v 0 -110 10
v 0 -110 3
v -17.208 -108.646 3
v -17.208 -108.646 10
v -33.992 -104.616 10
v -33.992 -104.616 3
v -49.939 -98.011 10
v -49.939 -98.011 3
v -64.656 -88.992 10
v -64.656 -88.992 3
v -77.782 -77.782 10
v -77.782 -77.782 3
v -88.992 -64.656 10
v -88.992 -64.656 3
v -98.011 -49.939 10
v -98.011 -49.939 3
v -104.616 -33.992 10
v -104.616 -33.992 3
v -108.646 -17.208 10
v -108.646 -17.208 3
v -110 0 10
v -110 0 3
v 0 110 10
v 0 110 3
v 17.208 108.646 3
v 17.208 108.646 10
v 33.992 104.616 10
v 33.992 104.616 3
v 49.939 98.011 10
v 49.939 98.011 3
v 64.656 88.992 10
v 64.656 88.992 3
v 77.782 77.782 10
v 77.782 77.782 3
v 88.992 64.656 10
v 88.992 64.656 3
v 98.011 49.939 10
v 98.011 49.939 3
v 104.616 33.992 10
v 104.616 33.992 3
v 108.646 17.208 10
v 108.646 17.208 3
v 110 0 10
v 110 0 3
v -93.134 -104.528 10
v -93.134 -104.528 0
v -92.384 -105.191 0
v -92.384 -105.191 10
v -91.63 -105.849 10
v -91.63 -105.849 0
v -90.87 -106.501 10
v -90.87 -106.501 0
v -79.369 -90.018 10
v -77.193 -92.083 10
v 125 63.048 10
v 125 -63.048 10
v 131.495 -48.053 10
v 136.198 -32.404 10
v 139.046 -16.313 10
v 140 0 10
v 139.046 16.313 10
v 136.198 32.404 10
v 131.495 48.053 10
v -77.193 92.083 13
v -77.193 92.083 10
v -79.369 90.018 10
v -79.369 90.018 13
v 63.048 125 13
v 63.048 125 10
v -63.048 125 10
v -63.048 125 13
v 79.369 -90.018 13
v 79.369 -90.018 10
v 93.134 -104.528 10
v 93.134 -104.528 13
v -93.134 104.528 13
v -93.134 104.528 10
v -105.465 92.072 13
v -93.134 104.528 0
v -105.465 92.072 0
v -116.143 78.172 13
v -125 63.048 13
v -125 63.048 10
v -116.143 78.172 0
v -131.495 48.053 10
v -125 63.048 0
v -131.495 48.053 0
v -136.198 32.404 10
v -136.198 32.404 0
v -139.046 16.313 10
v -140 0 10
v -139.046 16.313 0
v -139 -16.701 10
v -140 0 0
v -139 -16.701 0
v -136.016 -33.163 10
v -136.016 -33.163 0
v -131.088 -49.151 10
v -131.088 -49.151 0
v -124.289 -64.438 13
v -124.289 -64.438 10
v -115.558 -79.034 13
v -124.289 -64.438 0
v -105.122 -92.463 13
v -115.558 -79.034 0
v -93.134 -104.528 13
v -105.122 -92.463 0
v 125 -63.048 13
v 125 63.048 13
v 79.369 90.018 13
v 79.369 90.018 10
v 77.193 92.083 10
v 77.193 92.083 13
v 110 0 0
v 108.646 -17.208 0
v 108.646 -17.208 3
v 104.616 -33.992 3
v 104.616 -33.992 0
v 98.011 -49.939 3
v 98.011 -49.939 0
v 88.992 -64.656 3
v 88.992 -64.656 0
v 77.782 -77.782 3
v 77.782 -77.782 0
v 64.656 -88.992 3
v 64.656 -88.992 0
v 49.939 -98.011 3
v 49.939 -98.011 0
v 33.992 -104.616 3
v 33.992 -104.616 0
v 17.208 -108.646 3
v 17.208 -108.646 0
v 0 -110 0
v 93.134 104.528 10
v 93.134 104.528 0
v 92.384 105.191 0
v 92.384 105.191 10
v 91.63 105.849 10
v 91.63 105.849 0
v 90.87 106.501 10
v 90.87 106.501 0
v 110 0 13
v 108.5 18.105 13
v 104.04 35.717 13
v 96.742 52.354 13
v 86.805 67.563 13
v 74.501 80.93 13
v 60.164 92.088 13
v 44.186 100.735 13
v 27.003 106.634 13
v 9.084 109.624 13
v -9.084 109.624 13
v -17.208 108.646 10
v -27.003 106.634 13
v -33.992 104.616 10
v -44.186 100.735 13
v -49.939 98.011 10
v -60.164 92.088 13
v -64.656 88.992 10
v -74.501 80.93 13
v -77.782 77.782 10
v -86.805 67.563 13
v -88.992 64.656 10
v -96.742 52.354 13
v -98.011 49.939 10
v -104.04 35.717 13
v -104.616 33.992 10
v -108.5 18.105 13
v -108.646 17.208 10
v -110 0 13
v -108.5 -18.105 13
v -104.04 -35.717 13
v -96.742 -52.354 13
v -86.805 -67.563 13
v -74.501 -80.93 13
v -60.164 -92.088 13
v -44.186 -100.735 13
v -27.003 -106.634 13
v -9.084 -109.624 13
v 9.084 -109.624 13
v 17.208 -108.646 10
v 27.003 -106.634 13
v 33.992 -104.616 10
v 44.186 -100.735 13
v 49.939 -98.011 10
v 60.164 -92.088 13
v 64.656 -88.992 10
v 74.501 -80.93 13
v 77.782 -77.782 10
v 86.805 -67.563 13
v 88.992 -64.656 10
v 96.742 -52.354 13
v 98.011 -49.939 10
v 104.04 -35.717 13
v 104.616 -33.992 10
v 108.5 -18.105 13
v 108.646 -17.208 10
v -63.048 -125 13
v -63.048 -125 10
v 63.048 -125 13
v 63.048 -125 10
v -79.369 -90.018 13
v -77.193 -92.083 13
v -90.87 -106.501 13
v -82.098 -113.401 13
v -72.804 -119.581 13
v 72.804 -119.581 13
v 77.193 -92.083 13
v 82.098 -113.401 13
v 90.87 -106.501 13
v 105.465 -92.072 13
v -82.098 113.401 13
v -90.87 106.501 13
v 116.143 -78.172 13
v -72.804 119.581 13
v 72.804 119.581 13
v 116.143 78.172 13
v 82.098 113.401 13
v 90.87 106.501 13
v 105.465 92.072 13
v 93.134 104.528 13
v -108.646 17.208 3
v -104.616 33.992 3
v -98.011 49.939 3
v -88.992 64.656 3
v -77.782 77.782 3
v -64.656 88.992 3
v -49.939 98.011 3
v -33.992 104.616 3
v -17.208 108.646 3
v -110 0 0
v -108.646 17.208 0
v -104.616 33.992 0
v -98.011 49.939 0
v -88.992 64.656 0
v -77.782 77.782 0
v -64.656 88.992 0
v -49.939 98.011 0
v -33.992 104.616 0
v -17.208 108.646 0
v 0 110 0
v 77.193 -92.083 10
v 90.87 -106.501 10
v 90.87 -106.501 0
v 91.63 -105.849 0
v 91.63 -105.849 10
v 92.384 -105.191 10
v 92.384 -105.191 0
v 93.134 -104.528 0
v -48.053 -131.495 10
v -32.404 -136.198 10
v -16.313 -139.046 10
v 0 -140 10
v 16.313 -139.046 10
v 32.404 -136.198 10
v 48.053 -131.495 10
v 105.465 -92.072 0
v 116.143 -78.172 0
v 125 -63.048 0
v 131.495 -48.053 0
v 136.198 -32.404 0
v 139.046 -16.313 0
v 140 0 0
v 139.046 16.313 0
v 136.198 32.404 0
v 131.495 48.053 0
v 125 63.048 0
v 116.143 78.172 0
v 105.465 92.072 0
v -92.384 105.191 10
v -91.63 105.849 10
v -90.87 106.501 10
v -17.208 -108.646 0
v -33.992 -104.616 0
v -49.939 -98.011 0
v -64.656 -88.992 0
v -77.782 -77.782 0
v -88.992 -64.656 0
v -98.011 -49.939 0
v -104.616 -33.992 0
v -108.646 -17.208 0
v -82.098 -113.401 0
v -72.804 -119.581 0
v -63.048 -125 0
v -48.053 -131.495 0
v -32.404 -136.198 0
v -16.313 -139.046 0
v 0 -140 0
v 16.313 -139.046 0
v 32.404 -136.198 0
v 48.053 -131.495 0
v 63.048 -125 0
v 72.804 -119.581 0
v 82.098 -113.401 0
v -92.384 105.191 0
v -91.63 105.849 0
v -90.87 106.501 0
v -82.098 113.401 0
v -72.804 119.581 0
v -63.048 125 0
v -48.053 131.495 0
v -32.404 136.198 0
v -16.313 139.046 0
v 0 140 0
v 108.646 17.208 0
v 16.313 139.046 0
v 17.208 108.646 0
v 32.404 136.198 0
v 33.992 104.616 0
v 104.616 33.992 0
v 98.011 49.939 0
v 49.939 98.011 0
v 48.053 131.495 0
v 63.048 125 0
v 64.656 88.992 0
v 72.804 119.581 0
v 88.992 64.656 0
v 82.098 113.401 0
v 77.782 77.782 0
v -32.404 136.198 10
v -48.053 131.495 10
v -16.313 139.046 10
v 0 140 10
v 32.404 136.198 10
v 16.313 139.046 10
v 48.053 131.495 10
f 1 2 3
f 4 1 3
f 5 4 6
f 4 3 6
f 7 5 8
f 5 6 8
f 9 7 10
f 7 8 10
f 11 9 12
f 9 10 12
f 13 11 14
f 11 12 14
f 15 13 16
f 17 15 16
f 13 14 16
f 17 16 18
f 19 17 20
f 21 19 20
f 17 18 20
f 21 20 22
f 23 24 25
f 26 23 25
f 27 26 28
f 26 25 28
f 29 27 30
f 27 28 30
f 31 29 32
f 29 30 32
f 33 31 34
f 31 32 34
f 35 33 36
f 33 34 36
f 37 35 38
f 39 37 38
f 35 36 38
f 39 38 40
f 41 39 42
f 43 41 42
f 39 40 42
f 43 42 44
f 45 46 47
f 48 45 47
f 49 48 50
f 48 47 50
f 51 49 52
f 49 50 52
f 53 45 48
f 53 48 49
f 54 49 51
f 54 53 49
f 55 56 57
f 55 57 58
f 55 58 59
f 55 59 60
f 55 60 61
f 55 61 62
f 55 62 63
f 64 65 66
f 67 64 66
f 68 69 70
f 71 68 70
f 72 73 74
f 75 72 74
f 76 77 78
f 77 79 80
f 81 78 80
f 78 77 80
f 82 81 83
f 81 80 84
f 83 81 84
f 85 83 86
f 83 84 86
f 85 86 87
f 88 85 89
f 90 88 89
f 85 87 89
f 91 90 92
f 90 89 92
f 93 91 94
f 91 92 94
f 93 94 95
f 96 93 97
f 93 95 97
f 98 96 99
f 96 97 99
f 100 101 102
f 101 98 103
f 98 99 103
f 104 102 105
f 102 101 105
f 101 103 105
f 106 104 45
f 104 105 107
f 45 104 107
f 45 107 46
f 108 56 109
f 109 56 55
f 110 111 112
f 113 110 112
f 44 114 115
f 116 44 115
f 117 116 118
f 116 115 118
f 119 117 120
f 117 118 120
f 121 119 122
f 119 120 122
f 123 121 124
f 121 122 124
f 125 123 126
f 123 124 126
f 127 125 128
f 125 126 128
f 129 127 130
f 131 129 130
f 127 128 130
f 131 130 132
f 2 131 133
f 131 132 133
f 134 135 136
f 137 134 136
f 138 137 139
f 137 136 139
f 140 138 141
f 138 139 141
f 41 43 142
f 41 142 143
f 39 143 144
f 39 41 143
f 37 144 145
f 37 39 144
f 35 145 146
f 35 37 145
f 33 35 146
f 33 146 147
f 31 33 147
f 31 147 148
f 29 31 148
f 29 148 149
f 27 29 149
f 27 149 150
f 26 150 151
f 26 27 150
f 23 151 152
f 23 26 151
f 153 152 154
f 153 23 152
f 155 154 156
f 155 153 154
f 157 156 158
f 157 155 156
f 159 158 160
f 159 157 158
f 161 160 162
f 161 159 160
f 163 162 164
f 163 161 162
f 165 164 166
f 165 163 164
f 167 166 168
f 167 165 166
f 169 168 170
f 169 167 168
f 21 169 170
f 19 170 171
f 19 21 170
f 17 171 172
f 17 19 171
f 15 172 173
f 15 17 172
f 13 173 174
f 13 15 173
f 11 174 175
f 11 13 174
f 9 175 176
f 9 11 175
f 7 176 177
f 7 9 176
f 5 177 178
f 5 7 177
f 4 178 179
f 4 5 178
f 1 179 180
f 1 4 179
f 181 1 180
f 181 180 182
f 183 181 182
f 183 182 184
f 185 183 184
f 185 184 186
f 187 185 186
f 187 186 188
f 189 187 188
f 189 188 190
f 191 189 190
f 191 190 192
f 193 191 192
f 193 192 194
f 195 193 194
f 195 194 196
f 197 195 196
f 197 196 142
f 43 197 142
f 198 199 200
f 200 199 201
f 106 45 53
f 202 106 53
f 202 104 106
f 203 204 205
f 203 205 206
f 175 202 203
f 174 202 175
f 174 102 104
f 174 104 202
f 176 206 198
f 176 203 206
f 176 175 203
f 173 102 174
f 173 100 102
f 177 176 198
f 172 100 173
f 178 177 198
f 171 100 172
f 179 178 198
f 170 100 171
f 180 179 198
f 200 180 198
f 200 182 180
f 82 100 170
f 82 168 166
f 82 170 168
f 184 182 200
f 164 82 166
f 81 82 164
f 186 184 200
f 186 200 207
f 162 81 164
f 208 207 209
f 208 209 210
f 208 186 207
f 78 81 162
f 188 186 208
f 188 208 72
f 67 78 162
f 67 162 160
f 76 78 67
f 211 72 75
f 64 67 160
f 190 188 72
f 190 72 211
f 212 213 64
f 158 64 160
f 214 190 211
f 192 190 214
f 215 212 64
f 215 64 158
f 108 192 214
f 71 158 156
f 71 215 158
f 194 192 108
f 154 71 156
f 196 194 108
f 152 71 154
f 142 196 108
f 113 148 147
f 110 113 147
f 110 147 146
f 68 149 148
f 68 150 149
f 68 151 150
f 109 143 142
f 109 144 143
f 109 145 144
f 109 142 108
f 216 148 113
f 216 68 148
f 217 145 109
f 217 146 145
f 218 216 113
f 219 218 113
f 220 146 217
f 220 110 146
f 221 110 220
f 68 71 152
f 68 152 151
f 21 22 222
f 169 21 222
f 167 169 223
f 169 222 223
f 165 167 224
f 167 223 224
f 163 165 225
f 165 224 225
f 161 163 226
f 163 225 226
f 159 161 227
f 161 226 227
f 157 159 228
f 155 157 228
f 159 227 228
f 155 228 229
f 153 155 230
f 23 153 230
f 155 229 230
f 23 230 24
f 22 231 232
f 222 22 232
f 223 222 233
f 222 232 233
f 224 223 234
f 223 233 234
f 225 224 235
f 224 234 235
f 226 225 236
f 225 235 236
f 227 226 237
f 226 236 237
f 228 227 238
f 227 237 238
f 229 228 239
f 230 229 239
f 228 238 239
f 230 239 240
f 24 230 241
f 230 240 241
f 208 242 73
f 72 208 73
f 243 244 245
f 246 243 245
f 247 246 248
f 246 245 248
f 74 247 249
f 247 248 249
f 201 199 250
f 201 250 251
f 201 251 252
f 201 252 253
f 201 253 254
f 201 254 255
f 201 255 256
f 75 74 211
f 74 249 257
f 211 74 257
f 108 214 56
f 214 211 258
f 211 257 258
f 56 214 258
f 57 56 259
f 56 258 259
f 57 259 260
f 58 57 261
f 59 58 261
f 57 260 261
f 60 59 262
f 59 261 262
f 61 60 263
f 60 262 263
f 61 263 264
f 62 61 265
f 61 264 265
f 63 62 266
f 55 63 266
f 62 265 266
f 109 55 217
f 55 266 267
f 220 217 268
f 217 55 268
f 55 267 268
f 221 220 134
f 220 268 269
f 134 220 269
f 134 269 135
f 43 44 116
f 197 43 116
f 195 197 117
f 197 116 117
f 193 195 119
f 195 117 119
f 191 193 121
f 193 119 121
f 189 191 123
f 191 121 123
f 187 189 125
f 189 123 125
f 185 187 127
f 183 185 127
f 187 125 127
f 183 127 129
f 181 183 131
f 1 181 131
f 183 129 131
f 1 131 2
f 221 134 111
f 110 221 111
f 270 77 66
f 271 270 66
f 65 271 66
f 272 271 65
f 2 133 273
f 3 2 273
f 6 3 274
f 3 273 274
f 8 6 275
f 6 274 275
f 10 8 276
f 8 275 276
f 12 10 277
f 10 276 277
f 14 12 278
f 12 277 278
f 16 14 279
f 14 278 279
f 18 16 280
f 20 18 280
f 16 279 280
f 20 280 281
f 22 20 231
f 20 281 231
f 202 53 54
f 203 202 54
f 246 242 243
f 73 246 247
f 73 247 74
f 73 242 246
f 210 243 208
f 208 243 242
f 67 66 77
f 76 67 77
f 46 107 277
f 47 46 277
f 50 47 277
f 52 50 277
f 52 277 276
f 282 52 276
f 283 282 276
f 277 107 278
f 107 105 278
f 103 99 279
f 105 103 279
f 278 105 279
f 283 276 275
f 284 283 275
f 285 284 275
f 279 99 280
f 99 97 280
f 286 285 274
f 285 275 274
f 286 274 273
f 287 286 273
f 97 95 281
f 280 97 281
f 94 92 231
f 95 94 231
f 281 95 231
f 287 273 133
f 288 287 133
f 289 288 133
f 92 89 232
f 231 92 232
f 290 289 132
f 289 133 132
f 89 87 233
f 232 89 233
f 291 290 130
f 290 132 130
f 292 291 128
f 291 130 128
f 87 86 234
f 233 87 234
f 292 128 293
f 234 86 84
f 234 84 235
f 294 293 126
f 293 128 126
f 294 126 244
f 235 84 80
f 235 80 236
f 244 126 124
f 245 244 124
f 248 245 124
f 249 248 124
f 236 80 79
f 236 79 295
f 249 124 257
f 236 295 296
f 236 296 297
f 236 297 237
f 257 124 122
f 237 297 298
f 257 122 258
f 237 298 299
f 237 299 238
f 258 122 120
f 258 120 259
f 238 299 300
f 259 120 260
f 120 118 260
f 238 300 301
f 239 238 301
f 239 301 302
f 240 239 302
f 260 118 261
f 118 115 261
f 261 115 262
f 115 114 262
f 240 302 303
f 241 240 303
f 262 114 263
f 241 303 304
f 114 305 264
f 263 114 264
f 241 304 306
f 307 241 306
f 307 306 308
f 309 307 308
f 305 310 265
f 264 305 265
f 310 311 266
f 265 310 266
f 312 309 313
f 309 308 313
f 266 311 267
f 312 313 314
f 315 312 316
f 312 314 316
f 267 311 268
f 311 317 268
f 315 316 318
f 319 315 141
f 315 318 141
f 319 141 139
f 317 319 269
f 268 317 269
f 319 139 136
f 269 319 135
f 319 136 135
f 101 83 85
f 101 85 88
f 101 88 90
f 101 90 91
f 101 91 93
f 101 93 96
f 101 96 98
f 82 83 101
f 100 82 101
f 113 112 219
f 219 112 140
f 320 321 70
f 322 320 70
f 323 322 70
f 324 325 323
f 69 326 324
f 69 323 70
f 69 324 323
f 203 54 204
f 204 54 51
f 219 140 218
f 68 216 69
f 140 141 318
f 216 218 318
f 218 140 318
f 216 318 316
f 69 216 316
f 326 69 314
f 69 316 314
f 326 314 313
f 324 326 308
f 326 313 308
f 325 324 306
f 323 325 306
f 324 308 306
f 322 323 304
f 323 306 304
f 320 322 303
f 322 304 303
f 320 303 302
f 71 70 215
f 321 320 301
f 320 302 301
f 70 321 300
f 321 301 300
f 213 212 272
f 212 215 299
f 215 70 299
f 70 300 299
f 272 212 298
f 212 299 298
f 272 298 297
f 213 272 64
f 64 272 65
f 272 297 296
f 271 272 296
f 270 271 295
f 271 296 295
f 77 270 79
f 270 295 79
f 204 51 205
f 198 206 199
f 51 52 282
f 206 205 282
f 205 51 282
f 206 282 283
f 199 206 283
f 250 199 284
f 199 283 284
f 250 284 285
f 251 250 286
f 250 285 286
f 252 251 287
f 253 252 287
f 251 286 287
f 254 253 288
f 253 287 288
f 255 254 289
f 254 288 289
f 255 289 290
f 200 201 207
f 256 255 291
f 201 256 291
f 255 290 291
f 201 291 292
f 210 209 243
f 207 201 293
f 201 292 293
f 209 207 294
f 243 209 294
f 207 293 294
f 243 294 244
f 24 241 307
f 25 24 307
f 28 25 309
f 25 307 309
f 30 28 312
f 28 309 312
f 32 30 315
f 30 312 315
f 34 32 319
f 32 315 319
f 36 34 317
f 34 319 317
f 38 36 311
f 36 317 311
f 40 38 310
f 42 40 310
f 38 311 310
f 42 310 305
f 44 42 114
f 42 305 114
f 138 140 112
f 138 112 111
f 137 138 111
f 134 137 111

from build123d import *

# Parameters (mm, degrees)
F1_DEPTH  = 3
F1_FACE_R = 110
F2_DEPTH  = 10


with BuildPart() as f1:
    # F0 (on Top) → F1 (new body)
    with BuildSketch(Plane.XY):
        with BuildLine():
            Line((125, 0), (125, 63.0476010646))
            ThreePointArc((125, 63.0476010646), (111.0212813649, 85.289360908), (93.1335914618, 104.5281499952))
            Line((93.1335914618, 104.5281499952), (79.3692223366, 90.01807961))
            Line((79.3692223366, 90.01807961), (77.1927117788, 92.0827349788))
            Line((77.1927117788, 92.0827349788), (90.8704397477, 106.5014703188))
            ThreePointArc((90.8704397477, 106.5014703188), (77.512835853, 116.5837050279), (63.0476010646, 125))
            Line((63.0476010646, 125), (0, 125))
            Line((0, 125), (0, 110))
            ThreePointArc((0, 110), (77.7817459305, 77.7817459305), (110, 0))
            Line((110, 0), (125, 0))
        make_face()
        with BuildLine():
            ThreePointArc((-110, 0), (-77.7817459305, 77.7817459305), (0, 110))
            Line((0, 110), (0, 125))
            Line((0, 125), (-63.0476010646, 125))
            ThreePointArc((-63.0476010646, 125), (-77.512835853, 116.5837050279), (-90.8704397477, 106.5014703188))
            Line((-90.8704397477, 106.5014703188), (-77.1927117788, 92.0827349788))
            Line((-77.1927117788, 92.0827349788), (-79.3692223366, 90.01807961))
            Line((-79.3692223366, 90.01807961), (-93.1335914618, 104.5281499952))
            ThreePointArc((-93.1335914618, 104.5281499952), (-111.0212813649, 85.289360908), (-125, 63.0476010646))
            Line((-125, 63.0476010646), (-124.6484353295, 0))
            Line((-124.6484353295, 0), (-110, 0))
        make_face()
        with BuildLine():
            Line((0, -125), (0, -110))
            ThreePointArc((0, -110), (-77.7817459305, -77.7817459305), (-110, 0))
            Line((-110, 0), (-124.6484353295, 0))
            Line((-124.6484353295, 0), (-124.2891193215, -64.4376816644))
            ThreePointArc((-124.2891193215, -64.4376816644), (-110.543974073, -85.9070998006), (-93.1335914618, -104.5281499952))
            Line((-93.1335914618, -104.5281499952), (-79.3692223366, -90.01807961))
            Line((-79.3692223366, -90.01807961), (-77.1927117788, -92.0827349788))
            Line((-77.1927117788, -92.0827349788), (-90.8704397477, -106.5014703188))
            ThreePointArc((-90.8704397477, -106.5014703188), (-77.512835853, -116.5837050279), (-63.0476010646, -125))
            Line((-63.0476010646, -125), (0, -125))
        make_face()
        with BuildLine():
            ThreePointArc((93.1335914618, -104.5281499952), (111.0212813649, -85.289360908), (125, -63.0476010646))
            Line((125, -63.0476010646), (125, 0))
            Line((125, 0), (110, 0))
            ThreePointArc((110, 0), (77.7817459305, -77.7817459305), (0, -110))
            Line((0, -110), (0, -125))
            Line((0, -125), (63.0476010646, -125))
            ThreePointArc((63.0476010646, -125), (77.512835853, -116.5837050279), (90.8704397477, -106.5014703188))
            Line((90.8704397477, -106.5014703188), (77.1927117788, -92.0827349788))
            Line((77.1927117788, -92.0827349788), (79.3692223366, -90.01807961))
            Line((79.3692223366, -90.01807961), (93.1335914618, -104.5281499952))
        make_face()
    extrude(amount=F1_DEPTH)

    # F0 (on Top) + F1_face (on face) → F2 (join)
    with BuildSketch(Plane.XY):
        with BuildLine():
            Line((125, 0), (140, 0))
            ThreePointArc((140, 0), (136.1983847188, 32.403703492), (125, 63.0476010646))
            Line((125, 63.0476010646), (125, 0))
        make_face()
        with BuildLine():
            ThreePointArc((125, -63.0476010646), (136.1983847188, -32.403703492), (140, 0))
            Line((140, 0), (125, 0))
            Line((125, 0), (125, -63.0476010646))
        make_face()
        with BuildLine():
            Line((125, 0), (125, 63.0476010646))
            ThreePointArc((125, 63.0476010646), (111.0212813649, 85.289360908), (93.1335914618, 104.5281499952))
            Line((93.1335914618, 104.5281499952), (79.3692223366, 90.01807961))
            Line((79.3692223366, 90.01807961), (77.1927117788, 92.0827349788))
            Line((77.1927117788, 92.0827349788), (90.8704397477, 106.5014703188))
            ThreePointArc((90.8704397477, 106.5014703188), (77.512835853, 116.5837050279), (63.0476010646, 125))
            Line((63.0476010646, 125), (0, 125))
            Line((0, 125), (0, 110))
            ThreePointArc((0, 110), (77.7817459305, 77.7817459305), (110, 0))
            Line((110, 0), (125, 0))
        make_face()
        with BuildLine():
            ThreePointArc((93.1335914618, -104.5281499952), (111.0212813649, -85.289360908), (125, -63.0476010646))
            Line((125, -63.0476010646), (125, 0))
            Line((125, 0), (110, 0))
            ThreePointArc((110, 0), (77.7817459305, -77.7817459305), (0, -110))
            Line((0, -110), (0, -125))
            Line((0, -125), (63.0476010646, -125))
            ThreePointArc((63.0476010646, -125), (77.512835853, -116.5837050279), (90.8704397477, -106.5014703188))
            Line((90.8704397477, -106.5014703188), (77.1927117788, -92.0827349788))
            Line((77.1927117788, -92.0827349788), (79.3692223366, -90.01807961))
            Line((79.3692223366, -90.01807961), (93.1335914618, -104.5281499952))
        make_face()
        with BuildLine():
            Line((90.8704397477, 106.5014703188), (93.1335914618, 104.5281499952))
            ThreePointArc((93.1335914618, 104.5281499952), (92.0073060882, 105.5208776801), (90.8704397477, 106.5014703188))
        make_face()
        Polygon((79.3692223366, 90.01807961), (93.1335914618, 104.5281499952), (90.8704397477, 106.5014703188), (77.1927117788, 92.0827349788), align=None)
        with BuildLine():
            ThreePointArc((90.8704397477, -106.5014703188), (92.0073060882, -105.5208776801), (93.1335914618, -104.5281499952))
            Line((93.1335914618, -104.5281499952), (90.8704397477, -106.5014703188))
        make_face()
        Polygon((90.8704397477, -106.5014703188), (93.1335914618, -104.5281499952), (79.3692223366, -90.01807961), (77.1927117788, -92.0827349788), align=None)
        with BuildLine():
            ThreePointArc((-110, 0), (-77.7817459305, 77.7817459305), (0, 110))
            Line((0, 110), (0, 125))
            Line((0, 125), (-63.0476010646, 125))
            ThreePointArc((-63.0476010646, 125), (-77.512835853, 116.5837050279), (-90.8704397477, 106.5014703188))
            Line((-90.8704397477, 106.5014703188), (-77.1927117788, 92.0827349788))
            Line((-77.1927117788, 92.0827349788), (-79.3692223366, 90.01807961))
            Line((-79.3692223366, 90.01807961), (-93.1335914618, 104.5281499952))
            ThreePointArc((-93.1335914618, 104.5281499952), (-111.0212813649, 85.289360908), (-125, 63.0476010646))
            Line((-125, 63.0476010646), (-124.6484353295, 0))
            Line((-124.6484353295, 0), (-110, 0))
        make_face()
        with BuildLine():
            Line((0, -125), (0, -110))
            ThreePointArc((0, -110), (-77.7817459305, -77.7817459305), (-110, 0))
            Line((-110, 0), (-124.6484353295, 0))
            Line((-124.6484353295, 0), (-124.2891193215, -64.4376816644))
            ThreePointArc((-124.2891193215, -64.4376816644), (-110.543974073, -85.9070998006), (-93.1335914618, -104.5281499952))
            Line((-93.1335914618, -104.5281499952), (-79.3692223366, -90.01807961))
            Line((-79.3692223366, -90.01807961), (-77.1927117788, -92.0827349788))
            Line((-77.1927117788, -92.0827349788), (-90.8704397477, -106.5014703188))
            ThreePointArc((-90.8704397477, -106.5014703188), (-77.512835853, -116.5837050279), (-63.0476010646, -125))
            Line((-63.0476010646, -125), (0, -125))
        make_face()
        with BuildLine():
            Line((0, 125), (63.0476010646, 125))
            ThreePointArc((63.0476010646, 125), (32.403703492, 136.1983847188), (0, 140))
            Line((0, 140), (0, 125))
        make_face()
        with BuildLine():
            ThreePointArc((0, -140), (32.403703492, -136.1983847188), (63.0476010646, -125))
            Line((63.0476010646, -125), (0, -125))
            Line((0, -125), (0, -140))
        make_face()
        with BuildLine():
            Line((-63.0476010646, 125), (0, 125))
            Line((0, 125), (0, 140))
            ThreePointArc((0, 140), (-32.403703492, 136.1983847188), (-63.0476010646, 125))
        make_face()
        with BuildLine():
            Line((0, -140), (0, -125))
            Line((0, -125), (-63.0476010646, -125))
            ThreePointArc((-63.0476010646, -125), (-32.403703492, -136.1983847188), (0, -140))
        make_face()
        with BuildLine():
            Line((-124.2891193215, -64.4376816644), (-124.6484353295, 0))
            Line((-124.6484353295, 0), (-125, 0))
            Line((-125, 0), (-140, 0))
            ThreePointArc((-140, 0), (-136.0155812858, -33.1626544096), (-124.2891193215, -64.4376816644))
        make_face()
        Polygon((-125, 0), (-124.6484353295, 0), (-125, 63.0476010646), align=None)
        with BuildLine():
            Line((-140, 0), (-125, 0))
            Line((-125, 0), (-125, 63.0476010646))
            ThreePointArc((-125, 63.0476010646), (-136.1983847188, 32.403703492), (-140, 0))
        make_face()
        with BuildLine():
            Line((-93.1335914618, 104.5281499952), (-90.8704397477, 106.5014703188))
            ThreePointArc((-90.8704397477, 106.5014703188), (-92.0073060882, 105.5208776801), (-93.1335914618, 104.5281499952))
        make_face()
        Polygon((-77.1927117788, 92.0827349788), (-90.8704397477, 106.5014703188), (-93.1335914618, 104.5281499952), (-79.3692223366, 90.01807961), align=None)
        Polygon((-93.1335914618, -104.5281499952), (-90.8704397477, -106.5014703188), (-77.1927117788, -92.0827349788), (-79.3692223366, -90.01807961), align=None)
        with BuildLine():
            ThreePointArc((-93.1335914618, -104.5281499952), (-92.0073060882, -105.5208776801), (-90.8704397477, -106.5014703188))
            Line((-90.8704397477, -106.5014703188), (-93.1335914618, -104.5281499952))
        make_face()
    with BuildSketch(Plane(origin=(0.3076396833, 0.0529685728, 3), x_dir=(1, 0, 0), z_dir=(0, 0, 1))):
        with BuildLine():
            ThreePointArc((124.6923603167, 62.9946324918), (110.7136416816, 85.2363923352), (92.8259517786, 104.4751814224))
            Line((92.8259517786, 104.4751814224), (79.0615826533, 89.9651110372))
            Line((79.0615826533, 89.9651110372), (76.8850720955, 92.029766406))
            Line((76.8850720955, 92.029766406), (90.5628000645, 106.448501746))
            ThreePointArc((90.5628000645, 106.448501746), (77.2051961697, 116.5307364551), (62.7399613813, 124.9470314272))
            Line((62.7399613813, 124.9470314272), (-63.3552407479, 124.9470314272))
            ThreePointArc((-63.3552407479, 124.9470314272), (-77.8204755362, 116.5307364551), (-91.178079431, 106.448501746))
            Line((-91.178079431, 106.448501746), (-77.5003514621, 92.029766406))
            Line((-77.5003514621, 92.029766406), (-79.6768620198, 89.9651110372))
            Line((-79.6768620198, 89.9651110372), (-93.4412311451, 104.4751814224))
            ThreePointArc((-93.4412311451, 104.4751814224), (-111.3289210482, 85.2363923352), (-125.3076396833, 62.9946324918))
            Line((-125.3076396833, 62.9946324918), (-124.5967590048, -64.4906502372))
            ThreePointArc((-124.5967590048, -64.4906502372), (-110.8516137562, -85.9600683734), (-93.4412311451, -104.581118568))
            Line((-93.4412311451, -104.581118568), (-79.6768620198, -90.0710481828))
            Line((-79.6768620198, -90.0710481828), (-77.5003514621, -92.1357035515))
            Line((-77.5003514621, -92.1357035515), (-91.178079431, -106.5544388915))
            ThreePointArc((-91.178079431, -106.5544388915), (-77.8204755362, -116.6366736007), (-63.3552407479, -125.0529685728))
            Line((-63.3552407479, -125.0529685728), (62.7399613813, -125.0529685728))
            ThreePointArc((62.7399613813, -125.0529685728), (77.2051961697, -116.6366736007), (90.5628000645, -106.5544388915))
            Line((90.5628000645, -106.5544388915), (76.8850720955, -92.1357035515))
            Line((76.8850720955, -92.1357035515), (79.0615826533, -90.0710481828))
            Line((79.0615826533, -90.0710481828), (92.8259517786, -104.581118568))
            ThreePointArc((92.8259517786, -104.581118568), (110.7136416816, -85.3423294808), (124.6923603167, -63.1005696374))
            Line((124.6923603167, -63.1005696374), (124.6923603167, 62.9946324918))
        make_face()
        with Locations((-0.3076396833, -0.0529685728)):
            Circle(F1_FACE_R, mode=Mode.SUBTRACT)
    extrude(amount=F2_DEPTH)


solid = f1.part
